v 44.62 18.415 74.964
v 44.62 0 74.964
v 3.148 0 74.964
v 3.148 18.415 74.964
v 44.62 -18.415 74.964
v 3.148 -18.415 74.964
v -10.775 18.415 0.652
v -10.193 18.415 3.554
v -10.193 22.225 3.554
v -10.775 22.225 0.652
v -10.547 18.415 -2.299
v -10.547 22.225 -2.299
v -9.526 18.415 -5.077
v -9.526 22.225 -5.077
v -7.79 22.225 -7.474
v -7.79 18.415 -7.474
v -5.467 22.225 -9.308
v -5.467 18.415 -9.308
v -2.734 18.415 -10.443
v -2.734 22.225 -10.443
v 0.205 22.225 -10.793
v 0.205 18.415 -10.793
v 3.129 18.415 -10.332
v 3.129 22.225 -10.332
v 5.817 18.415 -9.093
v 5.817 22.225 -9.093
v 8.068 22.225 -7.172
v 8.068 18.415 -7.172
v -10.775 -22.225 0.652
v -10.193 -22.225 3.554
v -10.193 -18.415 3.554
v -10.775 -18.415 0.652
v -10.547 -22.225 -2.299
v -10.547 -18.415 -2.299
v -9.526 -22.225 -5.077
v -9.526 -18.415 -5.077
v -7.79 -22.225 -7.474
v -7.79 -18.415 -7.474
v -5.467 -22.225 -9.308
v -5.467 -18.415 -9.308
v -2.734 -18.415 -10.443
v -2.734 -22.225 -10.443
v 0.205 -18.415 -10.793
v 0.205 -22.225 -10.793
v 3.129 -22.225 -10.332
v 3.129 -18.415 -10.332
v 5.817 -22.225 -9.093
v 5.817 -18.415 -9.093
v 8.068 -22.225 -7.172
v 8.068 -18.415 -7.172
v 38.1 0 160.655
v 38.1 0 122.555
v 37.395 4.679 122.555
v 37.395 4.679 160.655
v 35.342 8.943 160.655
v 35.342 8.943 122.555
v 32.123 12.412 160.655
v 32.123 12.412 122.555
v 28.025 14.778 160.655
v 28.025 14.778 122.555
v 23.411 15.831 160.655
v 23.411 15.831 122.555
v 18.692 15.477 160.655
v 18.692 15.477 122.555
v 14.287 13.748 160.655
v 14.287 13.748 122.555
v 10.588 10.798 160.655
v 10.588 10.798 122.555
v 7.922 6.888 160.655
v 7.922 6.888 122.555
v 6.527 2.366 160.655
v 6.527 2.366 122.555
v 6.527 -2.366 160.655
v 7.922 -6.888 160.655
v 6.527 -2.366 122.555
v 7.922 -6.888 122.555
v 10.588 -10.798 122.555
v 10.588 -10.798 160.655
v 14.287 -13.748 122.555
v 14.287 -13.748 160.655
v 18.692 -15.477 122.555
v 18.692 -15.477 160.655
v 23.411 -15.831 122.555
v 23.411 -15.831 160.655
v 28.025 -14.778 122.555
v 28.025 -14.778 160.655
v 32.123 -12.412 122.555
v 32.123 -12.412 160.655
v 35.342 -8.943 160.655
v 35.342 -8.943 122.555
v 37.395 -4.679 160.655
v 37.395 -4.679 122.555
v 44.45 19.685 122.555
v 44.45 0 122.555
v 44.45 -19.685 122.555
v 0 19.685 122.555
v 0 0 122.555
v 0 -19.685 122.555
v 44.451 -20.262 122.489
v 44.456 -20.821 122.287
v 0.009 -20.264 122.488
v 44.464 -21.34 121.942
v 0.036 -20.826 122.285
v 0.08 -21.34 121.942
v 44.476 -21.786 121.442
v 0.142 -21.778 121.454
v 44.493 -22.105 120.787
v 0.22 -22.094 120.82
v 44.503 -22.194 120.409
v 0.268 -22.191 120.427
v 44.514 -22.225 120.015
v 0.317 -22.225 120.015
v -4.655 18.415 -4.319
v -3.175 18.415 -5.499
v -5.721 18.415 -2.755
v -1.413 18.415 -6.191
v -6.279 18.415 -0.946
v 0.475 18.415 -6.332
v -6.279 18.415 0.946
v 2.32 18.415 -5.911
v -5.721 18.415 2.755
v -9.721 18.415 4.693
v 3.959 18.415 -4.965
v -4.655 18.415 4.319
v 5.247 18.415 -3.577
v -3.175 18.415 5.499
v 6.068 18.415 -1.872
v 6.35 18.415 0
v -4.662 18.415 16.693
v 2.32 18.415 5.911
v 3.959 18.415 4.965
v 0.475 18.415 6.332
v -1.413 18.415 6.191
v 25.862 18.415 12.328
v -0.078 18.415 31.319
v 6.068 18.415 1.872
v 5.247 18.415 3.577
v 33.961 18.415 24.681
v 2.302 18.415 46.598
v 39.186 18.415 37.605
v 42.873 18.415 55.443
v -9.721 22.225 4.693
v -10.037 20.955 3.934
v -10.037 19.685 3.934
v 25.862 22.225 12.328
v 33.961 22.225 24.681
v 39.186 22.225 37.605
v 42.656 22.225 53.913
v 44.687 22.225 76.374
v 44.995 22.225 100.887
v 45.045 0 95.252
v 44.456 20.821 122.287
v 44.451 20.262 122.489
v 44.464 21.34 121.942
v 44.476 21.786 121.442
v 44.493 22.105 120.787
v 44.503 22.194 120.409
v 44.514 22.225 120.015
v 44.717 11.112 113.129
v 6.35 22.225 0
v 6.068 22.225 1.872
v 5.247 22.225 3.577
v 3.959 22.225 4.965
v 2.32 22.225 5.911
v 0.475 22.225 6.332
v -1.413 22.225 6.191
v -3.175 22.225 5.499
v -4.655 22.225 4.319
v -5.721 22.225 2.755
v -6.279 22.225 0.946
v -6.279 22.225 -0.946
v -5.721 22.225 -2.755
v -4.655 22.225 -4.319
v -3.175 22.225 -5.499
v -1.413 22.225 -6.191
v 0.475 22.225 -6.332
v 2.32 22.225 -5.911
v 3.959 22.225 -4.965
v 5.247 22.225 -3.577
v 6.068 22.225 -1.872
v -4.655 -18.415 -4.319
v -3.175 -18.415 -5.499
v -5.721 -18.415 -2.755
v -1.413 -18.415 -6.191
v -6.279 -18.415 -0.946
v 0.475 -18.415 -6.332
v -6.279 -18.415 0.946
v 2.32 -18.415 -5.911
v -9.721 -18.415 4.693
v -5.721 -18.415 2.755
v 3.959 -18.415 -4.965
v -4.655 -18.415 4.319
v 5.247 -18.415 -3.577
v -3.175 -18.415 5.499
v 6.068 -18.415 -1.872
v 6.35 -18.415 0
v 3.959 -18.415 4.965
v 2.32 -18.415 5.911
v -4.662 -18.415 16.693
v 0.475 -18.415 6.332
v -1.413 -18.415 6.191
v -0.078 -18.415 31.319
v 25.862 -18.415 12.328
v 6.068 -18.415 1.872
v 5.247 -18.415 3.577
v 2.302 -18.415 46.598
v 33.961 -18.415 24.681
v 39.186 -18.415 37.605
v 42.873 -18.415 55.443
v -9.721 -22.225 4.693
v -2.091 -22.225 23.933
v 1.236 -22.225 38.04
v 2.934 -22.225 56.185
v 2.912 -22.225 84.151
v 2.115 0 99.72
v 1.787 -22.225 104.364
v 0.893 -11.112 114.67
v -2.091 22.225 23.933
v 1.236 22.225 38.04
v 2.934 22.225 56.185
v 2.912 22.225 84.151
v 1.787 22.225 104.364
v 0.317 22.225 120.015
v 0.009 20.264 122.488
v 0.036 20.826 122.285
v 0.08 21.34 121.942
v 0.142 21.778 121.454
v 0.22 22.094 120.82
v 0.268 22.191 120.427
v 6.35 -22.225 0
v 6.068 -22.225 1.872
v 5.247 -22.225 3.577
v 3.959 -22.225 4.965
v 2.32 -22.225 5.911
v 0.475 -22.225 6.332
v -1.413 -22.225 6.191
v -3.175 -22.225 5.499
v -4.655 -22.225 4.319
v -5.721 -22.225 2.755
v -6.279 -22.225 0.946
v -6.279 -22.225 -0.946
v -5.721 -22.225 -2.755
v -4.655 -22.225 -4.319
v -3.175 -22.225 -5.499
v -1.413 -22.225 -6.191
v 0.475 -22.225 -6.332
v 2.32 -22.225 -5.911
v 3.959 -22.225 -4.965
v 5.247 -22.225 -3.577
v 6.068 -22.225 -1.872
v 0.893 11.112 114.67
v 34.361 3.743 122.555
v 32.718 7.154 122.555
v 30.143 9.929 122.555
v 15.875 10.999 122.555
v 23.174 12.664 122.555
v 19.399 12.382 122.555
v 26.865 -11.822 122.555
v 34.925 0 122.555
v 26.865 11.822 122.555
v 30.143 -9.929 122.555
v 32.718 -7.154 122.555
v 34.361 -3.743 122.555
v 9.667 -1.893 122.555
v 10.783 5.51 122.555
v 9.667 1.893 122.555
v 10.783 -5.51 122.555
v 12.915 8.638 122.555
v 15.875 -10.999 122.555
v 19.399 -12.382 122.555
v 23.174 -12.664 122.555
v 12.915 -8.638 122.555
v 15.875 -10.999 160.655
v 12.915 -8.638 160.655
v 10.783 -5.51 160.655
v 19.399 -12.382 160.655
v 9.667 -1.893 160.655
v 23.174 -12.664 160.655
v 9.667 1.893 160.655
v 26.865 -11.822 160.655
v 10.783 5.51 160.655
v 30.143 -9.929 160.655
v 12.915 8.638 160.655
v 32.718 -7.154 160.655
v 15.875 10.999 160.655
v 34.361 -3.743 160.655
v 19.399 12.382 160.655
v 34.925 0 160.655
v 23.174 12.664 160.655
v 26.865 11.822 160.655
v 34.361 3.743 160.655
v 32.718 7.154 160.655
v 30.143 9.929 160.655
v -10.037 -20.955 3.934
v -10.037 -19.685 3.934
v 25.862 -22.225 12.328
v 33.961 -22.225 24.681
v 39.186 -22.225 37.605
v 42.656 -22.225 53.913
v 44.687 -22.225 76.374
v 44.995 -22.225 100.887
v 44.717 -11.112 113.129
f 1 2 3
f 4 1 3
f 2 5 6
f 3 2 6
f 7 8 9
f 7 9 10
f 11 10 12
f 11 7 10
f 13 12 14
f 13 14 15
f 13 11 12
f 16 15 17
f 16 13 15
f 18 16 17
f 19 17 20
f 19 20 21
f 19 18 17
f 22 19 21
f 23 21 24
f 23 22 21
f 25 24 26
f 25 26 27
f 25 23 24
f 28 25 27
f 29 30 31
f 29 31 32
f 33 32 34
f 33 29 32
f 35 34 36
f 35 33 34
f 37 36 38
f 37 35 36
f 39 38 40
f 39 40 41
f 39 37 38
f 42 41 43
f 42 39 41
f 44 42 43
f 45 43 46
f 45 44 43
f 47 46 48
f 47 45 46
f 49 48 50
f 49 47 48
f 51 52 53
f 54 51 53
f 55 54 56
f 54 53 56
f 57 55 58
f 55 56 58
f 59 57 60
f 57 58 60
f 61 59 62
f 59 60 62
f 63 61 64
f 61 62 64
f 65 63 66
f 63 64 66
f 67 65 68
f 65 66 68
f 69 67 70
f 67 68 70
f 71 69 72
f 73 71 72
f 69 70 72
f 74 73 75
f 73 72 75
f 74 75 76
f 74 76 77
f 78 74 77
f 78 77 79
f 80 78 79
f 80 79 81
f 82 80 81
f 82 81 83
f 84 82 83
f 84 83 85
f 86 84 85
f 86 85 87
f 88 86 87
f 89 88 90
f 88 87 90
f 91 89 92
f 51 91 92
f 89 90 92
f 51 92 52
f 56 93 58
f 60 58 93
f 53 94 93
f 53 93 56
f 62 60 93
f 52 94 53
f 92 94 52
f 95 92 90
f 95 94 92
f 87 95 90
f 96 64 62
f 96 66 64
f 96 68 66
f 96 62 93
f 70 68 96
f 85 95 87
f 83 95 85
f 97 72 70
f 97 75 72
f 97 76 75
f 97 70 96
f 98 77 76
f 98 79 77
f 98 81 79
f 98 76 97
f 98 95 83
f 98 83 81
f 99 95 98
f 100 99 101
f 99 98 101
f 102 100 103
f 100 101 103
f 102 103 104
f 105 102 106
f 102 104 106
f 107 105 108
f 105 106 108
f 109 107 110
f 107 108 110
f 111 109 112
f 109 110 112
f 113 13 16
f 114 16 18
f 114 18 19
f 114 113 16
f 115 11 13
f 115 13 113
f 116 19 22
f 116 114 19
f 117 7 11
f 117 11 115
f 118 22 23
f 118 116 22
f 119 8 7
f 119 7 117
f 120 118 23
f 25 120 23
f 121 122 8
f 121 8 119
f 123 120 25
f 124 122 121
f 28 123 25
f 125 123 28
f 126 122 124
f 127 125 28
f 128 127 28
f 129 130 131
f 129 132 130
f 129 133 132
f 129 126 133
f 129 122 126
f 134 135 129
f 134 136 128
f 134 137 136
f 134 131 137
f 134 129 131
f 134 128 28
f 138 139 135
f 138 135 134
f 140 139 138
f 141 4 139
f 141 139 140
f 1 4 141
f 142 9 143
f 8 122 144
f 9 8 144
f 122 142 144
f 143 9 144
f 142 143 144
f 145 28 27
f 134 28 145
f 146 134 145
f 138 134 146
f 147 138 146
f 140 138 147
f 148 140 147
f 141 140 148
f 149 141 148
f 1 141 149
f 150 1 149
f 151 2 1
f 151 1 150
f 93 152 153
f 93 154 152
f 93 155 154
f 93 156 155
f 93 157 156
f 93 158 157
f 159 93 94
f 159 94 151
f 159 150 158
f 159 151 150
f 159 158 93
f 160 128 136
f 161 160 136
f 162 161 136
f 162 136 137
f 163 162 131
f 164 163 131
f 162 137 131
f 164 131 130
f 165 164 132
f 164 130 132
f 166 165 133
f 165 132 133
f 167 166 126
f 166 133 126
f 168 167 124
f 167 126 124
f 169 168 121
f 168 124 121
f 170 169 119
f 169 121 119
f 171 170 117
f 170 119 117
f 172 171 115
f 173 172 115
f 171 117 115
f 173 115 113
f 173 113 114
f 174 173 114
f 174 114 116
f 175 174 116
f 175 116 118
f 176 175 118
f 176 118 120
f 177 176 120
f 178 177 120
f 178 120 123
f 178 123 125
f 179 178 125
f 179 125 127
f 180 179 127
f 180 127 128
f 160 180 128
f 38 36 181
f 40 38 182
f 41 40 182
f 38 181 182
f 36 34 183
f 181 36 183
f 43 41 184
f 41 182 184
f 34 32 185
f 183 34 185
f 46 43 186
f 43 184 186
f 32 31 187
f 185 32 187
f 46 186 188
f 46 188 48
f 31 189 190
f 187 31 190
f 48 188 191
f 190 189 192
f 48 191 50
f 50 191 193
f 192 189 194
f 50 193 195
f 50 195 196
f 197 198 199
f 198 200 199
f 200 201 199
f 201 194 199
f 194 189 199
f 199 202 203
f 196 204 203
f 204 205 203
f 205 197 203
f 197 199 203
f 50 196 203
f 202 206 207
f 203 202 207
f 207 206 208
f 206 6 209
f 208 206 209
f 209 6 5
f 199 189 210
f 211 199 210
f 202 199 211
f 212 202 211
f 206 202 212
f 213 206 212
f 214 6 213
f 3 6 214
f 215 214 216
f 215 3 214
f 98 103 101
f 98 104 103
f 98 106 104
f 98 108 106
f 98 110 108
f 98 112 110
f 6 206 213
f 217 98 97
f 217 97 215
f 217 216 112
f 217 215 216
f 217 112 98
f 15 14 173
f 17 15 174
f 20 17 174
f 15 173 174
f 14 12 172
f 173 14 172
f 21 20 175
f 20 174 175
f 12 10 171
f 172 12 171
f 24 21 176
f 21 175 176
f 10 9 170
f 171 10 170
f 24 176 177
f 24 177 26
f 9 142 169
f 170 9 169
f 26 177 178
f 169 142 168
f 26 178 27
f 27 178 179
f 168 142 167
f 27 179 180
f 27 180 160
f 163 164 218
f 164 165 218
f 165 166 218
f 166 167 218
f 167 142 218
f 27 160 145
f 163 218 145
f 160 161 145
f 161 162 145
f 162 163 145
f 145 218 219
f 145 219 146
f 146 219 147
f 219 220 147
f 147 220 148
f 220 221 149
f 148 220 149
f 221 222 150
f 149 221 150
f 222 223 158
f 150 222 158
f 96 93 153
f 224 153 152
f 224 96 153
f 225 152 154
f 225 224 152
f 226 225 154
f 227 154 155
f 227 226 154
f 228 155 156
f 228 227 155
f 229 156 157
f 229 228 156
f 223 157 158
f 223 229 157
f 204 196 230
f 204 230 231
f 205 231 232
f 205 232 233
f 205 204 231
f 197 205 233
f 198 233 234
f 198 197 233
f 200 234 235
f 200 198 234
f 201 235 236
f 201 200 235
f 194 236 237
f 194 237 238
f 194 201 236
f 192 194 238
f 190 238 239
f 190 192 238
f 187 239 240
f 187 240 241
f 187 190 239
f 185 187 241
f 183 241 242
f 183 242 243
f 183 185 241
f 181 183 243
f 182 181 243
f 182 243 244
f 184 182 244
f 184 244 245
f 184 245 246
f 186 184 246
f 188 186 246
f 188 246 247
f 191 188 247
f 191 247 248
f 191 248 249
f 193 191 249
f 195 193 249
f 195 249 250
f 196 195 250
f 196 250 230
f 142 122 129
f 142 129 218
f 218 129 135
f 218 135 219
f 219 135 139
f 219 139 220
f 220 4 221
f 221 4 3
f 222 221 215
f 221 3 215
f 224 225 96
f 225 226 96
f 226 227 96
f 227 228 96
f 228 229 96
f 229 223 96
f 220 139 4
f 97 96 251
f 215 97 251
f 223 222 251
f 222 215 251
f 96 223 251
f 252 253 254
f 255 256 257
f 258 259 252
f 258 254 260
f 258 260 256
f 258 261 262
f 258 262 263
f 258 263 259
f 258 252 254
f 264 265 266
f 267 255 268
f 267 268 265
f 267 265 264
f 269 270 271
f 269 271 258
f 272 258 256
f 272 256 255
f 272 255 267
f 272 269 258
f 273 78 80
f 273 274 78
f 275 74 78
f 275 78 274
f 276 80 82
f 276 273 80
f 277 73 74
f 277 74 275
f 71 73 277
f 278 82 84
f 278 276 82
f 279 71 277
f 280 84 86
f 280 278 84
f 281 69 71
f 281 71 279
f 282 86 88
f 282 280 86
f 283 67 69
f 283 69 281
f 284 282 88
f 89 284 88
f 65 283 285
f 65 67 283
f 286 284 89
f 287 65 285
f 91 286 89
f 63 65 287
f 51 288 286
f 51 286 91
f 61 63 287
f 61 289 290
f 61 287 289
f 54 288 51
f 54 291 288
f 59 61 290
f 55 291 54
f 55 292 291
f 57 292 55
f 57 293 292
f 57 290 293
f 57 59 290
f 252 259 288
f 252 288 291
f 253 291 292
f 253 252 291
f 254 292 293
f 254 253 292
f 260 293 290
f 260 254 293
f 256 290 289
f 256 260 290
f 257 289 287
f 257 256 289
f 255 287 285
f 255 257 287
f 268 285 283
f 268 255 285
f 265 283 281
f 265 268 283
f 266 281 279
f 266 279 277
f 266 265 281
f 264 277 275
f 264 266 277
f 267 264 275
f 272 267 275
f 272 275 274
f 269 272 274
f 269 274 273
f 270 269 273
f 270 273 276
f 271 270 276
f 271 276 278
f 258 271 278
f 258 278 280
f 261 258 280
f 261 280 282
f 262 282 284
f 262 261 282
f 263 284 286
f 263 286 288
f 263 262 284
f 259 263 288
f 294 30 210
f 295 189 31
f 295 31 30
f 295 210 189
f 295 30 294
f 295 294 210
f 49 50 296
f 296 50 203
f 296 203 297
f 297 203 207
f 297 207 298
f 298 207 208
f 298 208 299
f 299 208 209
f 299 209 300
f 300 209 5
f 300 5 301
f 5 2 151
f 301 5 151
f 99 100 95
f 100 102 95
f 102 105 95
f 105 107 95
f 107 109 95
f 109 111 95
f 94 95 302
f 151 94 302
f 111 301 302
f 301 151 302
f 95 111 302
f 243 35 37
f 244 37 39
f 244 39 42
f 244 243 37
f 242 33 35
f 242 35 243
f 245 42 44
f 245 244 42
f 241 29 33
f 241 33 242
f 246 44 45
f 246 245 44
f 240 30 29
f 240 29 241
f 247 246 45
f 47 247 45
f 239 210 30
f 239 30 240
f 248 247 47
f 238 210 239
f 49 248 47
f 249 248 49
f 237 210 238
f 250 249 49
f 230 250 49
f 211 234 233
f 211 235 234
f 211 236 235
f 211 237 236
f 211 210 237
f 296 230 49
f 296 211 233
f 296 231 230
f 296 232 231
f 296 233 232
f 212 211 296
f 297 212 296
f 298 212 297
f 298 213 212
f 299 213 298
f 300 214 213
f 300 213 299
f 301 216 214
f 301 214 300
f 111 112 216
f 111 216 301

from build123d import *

# Parameters (mm, degrees)
F0_R     = 6.35
F1_DEPTH = 22.225
F3_START = -3.81
F2_R     = 6.35
F3_DEPTH = 36.83
F4_R     = 2.54
F5_R     = 15.875
F5_R_2   = 12.7
F6_DEPTH = 38.1


with BuildPart() as f1:
    # F0 (on Front) → F1 (new body, symmetric)
    with BuildSketch(Plane.XZ):
        with BuildLine():
            ThreePointArc((10.795, 0), (10.0903202689, -3.8363344316), (8.0682817284, -7.1718097403))
            add(Edge.make_bspline(
                [(8.0682817284, -7.1718097403), (18.3314368443, 4.3742337124), (49.2048537067, 28.6038800637), (44.8115600697, 105.7834102392), (44.45, 122.555)],
                knots=[0, 0, 0, 0, 0.437438064, 1, 1, 1, 1], degree=3))
            Line((44.45, 122.555), (0, 122.555))
            add(Edge.make_bspline(
                [(-9.7214930713, 4.693037126), (-5.6266365314, 14.4817428817), (7.0887204267, 39.064865347), (1.9933782166, 107.4782697451), (0, 122.555)],
                knots=[0.0153556046, 0.0153556046, 0.0153556046, 0.0153556046, 0.4111383309, 1, 1, 1, 1], degree=3))
            ThreePointArc((-9.7214930713, 4.693037126), (2.4071255987, 10.5232015733), (10.795, 0))
        make_face()
        with BuildLine():
            add(Edge.make_bspline(
                [(-10.1932944401, 3.5536985603), (-10.0377085134, 3.9336108023), (-9.8803655885, 4.313254267), (-9.7214930713, 4.693037126)],
                knots=[0, 0, 0, 0, 0.0153556046, 0.0153556046, 0.0153556046, 0.0153556046], degree=3))
            ThreePointArc((-10.1932944401, 3.5536985603), (-5.4669966008, -9.3082744463), (8.0682817284, -7.1718097403))
            ThreePointArc((8.0682817284, -7.1718097403), (10.0903202689, -3.8363344316), (10.795, 0))
            ThreePointArc((10.795, 0), (2.4071255987, 10.5232015733), (-9.7214930713, 4.693037126))
        make_face()
        Circle(F0_R, mode=Mode.SUBTRACT)
    extrude(amount=F1_DEPTH, both=True)

    # F2 (on face) → F3 (cut)
    with BuildSketch(Plane.XZ.offset(22.225).offset(F3_START)):
        with BuildLine():
            Line((44.6198632811, 74.9638513255), (3.1484367679, 74.9638513255))
            add(Edge.make_bspline(
                [(3.1484367679, 74.9638513255), (3.3300146443, 63.006702651), (2.3798836526, 29.1903381666), (-6.0275621352, 13.7256513389), (-10.1932944401, 3.5536985603)],
                knots=[0.3782225055, 0.3782225055, 0.3782225055, 0.3782225055, 0.6042172737, 1.0153556046, 1.0153556046, 1.0153556046, 1.0153556046], degree=3))
            ThreePointArc((-10.1932944401, 3.5536985603), (-5.4669966008, -9.3082744463), (8.0682817284, -7.1718097403))
            add(Edge.make_bspline(
                [(8.0682817284, -7.1718097403), (18.3314368443, 4.3742337124), (39.1338464971, 20.7000920192), (43.9250942912, 61.0653106264), (44.6198632811, 74.9638513255)],
                knots=[0, 0, 0, 0, 0.437438064, 0.6737968054, 0.6737968054, 0.6737968054, 0.6737968054], degree=3))
        make_face()
        Circle(F2_R, mode=Mode.SUBTRACT)
    extrude(amount=-F3_DEPTH, mode=Mode.SUBTRACT)

    # F4
    f4_edges = [f1.edges().sort_by_distance(p)[0] for p in [
        (22.225, -22.225, 122.555),
        (22.225, 22.225, 122.555),
    ]]
    fillet(f4_edges, radius=F4_R)

    # F5 (on face) → F6 (join)
    with BuildSketch(Plane.XY.offset(122.555)):
        with Locations((22.225, 0)):
            Circle(F5_R)
        with Locations((22.225, 0)):
            Circle(F5_R_2, mode=Mode.SUBTRACT)
    extrude(amount=F6_DEPTH)


solid = f1.part
